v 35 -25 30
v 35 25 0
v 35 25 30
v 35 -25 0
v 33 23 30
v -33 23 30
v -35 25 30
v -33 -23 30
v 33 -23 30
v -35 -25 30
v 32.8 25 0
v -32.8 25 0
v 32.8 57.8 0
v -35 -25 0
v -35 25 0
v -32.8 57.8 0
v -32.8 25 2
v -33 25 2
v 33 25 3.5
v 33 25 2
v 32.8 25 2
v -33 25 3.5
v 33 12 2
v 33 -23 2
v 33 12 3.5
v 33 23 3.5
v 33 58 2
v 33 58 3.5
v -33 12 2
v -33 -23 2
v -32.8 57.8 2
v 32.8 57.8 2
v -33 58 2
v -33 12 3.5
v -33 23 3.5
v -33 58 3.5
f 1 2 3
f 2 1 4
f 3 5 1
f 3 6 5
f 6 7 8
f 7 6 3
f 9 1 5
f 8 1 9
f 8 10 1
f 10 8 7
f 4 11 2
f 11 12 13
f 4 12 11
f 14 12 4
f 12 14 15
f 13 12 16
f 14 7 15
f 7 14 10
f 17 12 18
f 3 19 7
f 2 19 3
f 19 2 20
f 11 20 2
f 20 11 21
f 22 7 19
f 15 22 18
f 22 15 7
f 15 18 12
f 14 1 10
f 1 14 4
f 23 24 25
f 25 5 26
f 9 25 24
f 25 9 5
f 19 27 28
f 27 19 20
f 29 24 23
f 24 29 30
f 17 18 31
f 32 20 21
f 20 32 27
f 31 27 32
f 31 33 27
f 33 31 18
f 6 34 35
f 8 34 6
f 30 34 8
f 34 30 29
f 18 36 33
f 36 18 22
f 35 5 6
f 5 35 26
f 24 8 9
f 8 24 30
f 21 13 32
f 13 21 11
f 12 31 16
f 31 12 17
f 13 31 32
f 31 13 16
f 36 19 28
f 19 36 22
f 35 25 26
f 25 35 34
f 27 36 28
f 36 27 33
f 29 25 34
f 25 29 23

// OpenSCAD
// Two-part enclosure for small electronics board (e.g., Arduino-based logger)
// Print orientation: both parts flat on the bed, side by side

// ---------- Parameters ----------
box_len      = 70;    // box outer size in X (mm)
box_wid      = 50;    // box outer size in Y (mm)
box_h        = 30;    // box outer size in Z (mm)
box_wall     = 2;     // box wall thickness (mm)
box_floor    = 2;     // box floor thickness (mm)

lip_len      = 65.6;  // lid lip outer size in X (mm)
lip_wid      = 45.6;  // lid lip outer size in Y (mm)
lip_thick    = 1.5;   // lid lip thickness (mm)
lip_height   = 4;     // lid lip height above plate (mm)

plate_t      = 2;     // lid plate thickness (mm)

gap          = 10;    // gap between box and lid (mm)
cut_extra    = 0.5;   // extra length for cutting shapes past faces (mm)
$fn          = 64;    // curve resolution (no curves here; kept per convention)

// ---------- Derived ----------
lip_total_h  = plate_t + lip_height;   // top of lip above bed (mm)

// ---------- Modules ----------
module box() {
    // Open-top box: solid outer block with a hollowed-out interior
    difference() {
        translate([-box_len/2, -box_wid/2, 0])
            cube([box_len, box_wid, box_h]);

        // Interior cavity: from inside the floor up to the open top
        translate([-box_len/2 + box_wall, -box_wid/2 + box_wall, box_floor])
            cube([box_len - 2*box_wall,
                  box_wid - 2*box_wall,
                  box_h - box_floor + cut_extra]);
    }
}

module lid() {
    // Plate with a rectangular lip on top, sliding into the box opening
    union() {
        // Base plate
        translate([-lip_len/2, -lip_wid/2, 0])
            cube([lip_len, lip_wid, plate_t]);

        // Lip: wall thicker than box_wall by 0.2 mm clearance on each side
        translate([-lip_len/2 - 0.2, -lip_wid/2 - 0.2, plate_t])
            cube([lip_len + 0.4,
                  lip_wid + 0.4,
                  lip_thick]);
    }
}

// ---------- Assembly ----------
box();   // Print the box first (lower part)
translate([0, box_wid/2 + gap, 0])
    lid(); // Print the lid on the +X side, flat on the bed
